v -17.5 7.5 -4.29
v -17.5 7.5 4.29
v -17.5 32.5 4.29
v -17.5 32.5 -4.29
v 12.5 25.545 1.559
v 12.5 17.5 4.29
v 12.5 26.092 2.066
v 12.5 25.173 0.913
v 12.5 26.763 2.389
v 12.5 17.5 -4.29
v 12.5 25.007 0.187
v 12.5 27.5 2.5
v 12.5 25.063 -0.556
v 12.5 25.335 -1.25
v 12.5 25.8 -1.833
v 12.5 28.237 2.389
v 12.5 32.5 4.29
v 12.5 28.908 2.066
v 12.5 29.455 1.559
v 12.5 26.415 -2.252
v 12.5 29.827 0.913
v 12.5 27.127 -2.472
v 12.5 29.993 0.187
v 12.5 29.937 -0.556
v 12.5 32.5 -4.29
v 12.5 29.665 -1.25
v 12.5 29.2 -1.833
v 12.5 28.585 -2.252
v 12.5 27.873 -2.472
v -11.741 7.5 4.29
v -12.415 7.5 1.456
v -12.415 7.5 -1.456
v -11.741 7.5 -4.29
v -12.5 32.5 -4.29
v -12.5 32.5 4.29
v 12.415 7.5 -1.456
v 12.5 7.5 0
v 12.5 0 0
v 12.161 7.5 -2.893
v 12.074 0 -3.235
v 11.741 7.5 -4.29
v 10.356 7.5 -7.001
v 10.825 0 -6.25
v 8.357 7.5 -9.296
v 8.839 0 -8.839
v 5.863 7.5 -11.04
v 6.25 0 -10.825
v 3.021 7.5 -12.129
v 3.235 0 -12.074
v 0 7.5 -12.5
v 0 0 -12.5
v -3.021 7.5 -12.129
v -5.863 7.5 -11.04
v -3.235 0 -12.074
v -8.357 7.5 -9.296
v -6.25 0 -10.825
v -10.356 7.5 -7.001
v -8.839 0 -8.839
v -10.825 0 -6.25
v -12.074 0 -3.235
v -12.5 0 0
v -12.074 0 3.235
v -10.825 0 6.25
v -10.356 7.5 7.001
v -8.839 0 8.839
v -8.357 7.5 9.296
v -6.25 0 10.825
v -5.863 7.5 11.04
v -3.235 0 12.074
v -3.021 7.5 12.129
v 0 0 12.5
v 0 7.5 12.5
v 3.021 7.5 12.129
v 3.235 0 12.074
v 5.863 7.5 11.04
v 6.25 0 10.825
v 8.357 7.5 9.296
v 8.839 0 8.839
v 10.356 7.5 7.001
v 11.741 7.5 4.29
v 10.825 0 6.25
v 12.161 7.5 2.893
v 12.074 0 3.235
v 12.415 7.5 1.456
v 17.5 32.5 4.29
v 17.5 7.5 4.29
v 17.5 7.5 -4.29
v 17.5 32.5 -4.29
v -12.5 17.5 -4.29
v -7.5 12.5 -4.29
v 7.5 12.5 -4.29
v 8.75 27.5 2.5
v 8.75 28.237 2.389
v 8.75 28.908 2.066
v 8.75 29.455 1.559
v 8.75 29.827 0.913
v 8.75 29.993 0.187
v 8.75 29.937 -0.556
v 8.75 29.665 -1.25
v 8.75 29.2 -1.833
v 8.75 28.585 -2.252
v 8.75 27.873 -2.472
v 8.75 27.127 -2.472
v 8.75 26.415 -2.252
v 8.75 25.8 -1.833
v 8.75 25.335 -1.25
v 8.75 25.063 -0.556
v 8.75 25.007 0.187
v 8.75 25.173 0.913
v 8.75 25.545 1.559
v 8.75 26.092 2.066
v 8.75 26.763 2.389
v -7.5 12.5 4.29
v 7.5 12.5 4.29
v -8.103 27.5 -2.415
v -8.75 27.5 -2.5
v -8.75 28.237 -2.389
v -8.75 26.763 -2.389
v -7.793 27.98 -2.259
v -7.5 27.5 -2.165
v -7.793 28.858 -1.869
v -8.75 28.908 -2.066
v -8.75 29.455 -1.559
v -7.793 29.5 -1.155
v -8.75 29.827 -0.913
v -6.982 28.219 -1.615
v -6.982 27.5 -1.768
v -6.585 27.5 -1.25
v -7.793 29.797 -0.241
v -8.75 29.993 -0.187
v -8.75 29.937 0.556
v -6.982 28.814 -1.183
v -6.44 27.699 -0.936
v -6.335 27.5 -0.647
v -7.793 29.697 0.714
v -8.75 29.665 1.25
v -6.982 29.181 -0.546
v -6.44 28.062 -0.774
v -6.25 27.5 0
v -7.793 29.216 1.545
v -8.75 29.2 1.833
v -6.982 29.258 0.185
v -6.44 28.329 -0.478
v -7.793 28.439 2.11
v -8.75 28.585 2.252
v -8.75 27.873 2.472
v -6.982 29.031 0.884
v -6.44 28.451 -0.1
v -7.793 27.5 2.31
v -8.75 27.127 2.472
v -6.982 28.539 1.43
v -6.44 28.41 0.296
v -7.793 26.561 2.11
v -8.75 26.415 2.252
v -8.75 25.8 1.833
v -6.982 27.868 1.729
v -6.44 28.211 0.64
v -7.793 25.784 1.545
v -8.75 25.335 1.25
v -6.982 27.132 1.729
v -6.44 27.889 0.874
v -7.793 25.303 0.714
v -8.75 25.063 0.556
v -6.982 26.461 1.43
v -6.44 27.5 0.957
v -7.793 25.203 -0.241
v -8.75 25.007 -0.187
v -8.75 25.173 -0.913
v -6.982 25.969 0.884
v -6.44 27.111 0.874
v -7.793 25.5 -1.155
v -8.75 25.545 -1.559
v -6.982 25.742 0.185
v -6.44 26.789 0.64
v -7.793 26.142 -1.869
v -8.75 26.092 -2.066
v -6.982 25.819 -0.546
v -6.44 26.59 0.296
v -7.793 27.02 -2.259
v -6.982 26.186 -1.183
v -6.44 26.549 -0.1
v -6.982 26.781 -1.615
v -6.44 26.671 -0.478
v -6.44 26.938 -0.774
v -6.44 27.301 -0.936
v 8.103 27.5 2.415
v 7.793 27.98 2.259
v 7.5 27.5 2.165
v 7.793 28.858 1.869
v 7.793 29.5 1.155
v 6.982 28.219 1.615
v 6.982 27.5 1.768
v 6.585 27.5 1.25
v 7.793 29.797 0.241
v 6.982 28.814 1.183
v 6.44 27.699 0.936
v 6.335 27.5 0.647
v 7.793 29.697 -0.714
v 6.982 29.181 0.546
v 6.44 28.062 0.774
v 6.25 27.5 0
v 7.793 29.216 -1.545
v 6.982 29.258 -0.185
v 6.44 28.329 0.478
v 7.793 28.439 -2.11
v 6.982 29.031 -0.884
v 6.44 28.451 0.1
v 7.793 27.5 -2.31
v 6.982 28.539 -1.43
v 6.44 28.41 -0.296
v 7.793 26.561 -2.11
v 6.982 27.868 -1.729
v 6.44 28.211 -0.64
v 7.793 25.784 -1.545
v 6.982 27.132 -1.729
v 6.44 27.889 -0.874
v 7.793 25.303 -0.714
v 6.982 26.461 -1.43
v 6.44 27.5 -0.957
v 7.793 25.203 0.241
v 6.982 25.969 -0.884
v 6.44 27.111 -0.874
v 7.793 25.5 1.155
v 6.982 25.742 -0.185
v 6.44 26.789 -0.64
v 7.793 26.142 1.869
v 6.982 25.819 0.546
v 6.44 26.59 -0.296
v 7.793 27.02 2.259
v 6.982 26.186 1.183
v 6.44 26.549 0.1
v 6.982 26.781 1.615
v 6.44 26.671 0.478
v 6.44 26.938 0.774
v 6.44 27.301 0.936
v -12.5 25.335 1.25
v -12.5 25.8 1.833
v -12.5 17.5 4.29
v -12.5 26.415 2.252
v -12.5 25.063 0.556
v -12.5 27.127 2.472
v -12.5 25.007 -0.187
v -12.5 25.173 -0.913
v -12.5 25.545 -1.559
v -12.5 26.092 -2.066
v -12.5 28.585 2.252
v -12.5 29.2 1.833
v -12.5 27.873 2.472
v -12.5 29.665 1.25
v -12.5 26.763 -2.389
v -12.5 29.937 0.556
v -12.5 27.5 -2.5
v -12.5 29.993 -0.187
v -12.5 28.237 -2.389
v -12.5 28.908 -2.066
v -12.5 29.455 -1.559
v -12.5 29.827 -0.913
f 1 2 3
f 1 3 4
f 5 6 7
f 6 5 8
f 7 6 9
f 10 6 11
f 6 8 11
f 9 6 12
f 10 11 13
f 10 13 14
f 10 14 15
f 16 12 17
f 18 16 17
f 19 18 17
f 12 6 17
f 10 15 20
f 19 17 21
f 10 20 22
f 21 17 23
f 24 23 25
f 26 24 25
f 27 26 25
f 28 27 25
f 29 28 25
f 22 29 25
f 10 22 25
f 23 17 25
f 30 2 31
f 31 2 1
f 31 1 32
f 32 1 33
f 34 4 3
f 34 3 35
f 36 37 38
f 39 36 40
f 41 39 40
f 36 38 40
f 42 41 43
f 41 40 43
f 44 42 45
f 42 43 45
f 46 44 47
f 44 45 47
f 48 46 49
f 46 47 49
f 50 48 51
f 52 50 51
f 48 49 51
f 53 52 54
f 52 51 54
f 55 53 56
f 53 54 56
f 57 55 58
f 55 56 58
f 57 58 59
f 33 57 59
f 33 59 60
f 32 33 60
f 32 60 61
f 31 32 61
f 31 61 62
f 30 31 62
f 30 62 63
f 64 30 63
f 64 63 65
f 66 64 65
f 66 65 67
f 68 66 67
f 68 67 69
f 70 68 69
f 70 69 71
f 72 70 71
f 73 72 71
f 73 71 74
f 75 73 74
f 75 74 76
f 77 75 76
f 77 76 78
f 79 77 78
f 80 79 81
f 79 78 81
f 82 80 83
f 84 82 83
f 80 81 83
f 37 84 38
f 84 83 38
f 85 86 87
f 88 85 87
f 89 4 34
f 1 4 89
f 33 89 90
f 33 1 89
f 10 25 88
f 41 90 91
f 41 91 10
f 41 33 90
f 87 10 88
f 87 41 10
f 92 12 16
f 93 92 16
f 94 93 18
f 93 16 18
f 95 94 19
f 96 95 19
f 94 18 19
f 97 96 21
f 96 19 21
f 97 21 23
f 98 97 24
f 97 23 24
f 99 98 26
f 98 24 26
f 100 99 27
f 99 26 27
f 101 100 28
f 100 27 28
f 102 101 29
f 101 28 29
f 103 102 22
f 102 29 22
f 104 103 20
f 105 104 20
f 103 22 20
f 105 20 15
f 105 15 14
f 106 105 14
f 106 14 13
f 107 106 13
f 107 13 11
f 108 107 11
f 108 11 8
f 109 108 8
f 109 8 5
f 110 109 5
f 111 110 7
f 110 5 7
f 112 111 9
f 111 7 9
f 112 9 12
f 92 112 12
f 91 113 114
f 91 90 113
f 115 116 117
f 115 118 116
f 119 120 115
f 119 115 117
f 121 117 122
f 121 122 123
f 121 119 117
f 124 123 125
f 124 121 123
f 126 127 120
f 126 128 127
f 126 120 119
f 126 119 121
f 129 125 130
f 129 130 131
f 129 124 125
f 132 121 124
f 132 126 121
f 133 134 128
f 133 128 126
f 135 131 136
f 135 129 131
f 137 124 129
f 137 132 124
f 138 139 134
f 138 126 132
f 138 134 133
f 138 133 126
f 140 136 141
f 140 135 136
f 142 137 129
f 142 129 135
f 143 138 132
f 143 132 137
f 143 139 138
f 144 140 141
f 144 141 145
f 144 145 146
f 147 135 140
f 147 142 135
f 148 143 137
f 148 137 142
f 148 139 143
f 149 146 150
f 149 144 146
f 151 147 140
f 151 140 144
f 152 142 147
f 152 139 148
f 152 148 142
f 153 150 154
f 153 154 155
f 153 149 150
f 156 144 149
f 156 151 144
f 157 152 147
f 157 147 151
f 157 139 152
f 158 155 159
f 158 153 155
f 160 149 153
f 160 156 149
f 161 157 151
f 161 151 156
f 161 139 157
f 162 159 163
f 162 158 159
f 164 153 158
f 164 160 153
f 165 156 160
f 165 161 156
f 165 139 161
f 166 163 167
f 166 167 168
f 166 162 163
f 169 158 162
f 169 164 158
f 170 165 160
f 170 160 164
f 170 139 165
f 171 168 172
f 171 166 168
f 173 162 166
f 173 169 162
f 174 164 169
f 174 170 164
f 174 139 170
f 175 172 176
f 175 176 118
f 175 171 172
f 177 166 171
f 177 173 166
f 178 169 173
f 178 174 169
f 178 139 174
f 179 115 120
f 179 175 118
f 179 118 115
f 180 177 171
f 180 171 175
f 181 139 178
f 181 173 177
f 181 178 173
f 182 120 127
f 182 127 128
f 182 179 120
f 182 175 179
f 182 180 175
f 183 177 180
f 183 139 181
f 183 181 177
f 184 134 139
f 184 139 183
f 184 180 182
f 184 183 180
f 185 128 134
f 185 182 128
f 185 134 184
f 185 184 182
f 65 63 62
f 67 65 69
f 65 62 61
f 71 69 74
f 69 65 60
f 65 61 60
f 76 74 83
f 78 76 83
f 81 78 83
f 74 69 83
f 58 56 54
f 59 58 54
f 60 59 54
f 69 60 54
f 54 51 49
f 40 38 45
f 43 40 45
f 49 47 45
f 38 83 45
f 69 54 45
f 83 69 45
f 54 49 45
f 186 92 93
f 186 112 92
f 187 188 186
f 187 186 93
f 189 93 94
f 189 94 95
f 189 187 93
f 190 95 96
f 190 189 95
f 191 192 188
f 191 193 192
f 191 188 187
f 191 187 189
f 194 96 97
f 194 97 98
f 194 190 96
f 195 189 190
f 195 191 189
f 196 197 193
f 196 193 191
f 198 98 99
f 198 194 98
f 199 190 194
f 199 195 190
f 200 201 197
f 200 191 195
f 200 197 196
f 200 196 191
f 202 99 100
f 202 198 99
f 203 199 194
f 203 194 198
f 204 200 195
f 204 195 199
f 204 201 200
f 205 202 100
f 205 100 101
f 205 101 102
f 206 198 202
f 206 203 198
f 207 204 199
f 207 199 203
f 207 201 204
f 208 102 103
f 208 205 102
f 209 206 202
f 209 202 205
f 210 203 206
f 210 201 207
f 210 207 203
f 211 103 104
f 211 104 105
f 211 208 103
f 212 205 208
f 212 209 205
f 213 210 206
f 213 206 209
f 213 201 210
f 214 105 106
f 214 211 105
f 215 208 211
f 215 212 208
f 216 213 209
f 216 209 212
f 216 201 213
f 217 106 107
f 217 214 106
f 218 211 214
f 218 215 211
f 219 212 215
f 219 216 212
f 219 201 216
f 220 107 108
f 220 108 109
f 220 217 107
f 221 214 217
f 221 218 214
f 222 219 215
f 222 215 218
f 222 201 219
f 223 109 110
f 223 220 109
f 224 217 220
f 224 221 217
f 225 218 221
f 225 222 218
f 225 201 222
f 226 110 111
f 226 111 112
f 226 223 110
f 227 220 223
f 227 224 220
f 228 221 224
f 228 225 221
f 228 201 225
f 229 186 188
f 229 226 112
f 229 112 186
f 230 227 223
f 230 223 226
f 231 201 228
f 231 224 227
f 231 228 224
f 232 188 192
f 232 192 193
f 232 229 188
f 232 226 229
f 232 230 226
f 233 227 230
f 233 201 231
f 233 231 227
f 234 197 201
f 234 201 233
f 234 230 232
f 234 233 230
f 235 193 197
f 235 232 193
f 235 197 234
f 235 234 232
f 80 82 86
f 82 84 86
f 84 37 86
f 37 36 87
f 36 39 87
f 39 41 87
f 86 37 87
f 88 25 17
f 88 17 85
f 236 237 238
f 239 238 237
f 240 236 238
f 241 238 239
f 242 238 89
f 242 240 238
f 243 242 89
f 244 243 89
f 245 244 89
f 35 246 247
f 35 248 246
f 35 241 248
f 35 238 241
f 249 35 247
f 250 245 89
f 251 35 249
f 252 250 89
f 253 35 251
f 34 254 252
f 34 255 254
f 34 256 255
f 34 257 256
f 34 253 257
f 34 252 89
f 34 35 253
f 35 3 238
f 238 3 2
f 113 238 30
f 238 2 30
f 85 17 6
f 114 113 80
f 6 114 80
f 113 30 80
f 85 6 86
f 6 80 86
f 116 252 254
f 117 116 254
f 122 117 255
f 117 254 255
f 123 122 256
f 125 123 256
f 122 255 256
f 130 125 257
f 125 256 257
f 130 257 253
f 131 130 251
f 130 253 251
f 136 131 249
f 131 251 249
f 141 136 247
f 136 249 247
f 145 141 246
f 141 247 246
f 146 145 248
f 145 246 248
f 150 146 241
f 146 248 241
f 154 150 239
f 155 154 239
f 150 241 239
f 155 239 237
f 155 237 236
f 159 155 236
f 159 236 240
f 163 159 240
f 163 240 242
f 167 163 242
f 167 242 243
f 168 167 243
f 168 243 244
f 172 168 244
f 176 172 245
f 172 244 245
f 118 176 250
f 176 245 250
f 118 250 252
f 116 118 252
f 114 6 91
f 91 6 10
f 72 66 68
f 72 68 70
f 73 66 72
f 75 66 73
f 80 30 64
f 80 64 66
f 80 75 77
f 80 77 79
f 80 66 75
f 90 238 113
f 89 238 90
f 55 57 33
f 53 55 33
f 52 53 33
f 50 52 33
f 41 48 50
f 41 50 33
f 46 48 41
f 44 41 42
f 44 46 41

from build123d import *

# Parameters (mm, degrees)
SKETCH1_R           = 12.5
BOSS_EXTRUDE1_DEPTH = 7.5
SKETCH2_W           = 35
SKETCH2_H           = 8.580767914
BOSS_EXTRUDE2_DEPTH = 25
SKETCH3_W           = 25
SKETCH3_H           = 8.580767914
CUT_EXTRUDE1_DEPTH  = 20
SKETCH4_R           = 2.5
BOSS_EXTRUDE3_DEPTH = 6.25
SKETCH5_R           = 2.5
BOSS_EXTRUDE4_DEPTH = 6.25
CHAMFER1_SIZE       = 5
CHAMFER2_SIZE       = 5
FILLET1_R           = 2.5
FILLET2_R           = 2.5


with BuildPart() as part:
    # Sketch1 → Boss-Extrude1 (new body)
    with BuildSketch(Plane(origin=(0, 0, 0), x_dir=(1, 0, 0), z_dir=(0, 1, 0))):
        Circle(SKETCH1_R)
    extrude(amount=BOSS_EXTRUDE1_DEPTH)

    # Sketch2 → Boss-Extrude2 (add)
    with BuildSketch(Plane(origin=(0, 7.5, 0), x_dir=(1, 0, 0), z_dir=(0, 1, 0))):
        Rectangle(SKETCH2_W, SKETCH2_H)
    extrude(amount=BOSS_EXTRUDE2_DEPTH)

    # Sketch3 → Cut-Extrude1 (cut)
    with BuildSketch(Plane(origin=(0, 32.5, 0), x_dir=(1, 0, 0), z_dir=(0, 1, 0))):
        Rectangle(SKETCH3_W, SKETCH3_H)
    extrude(amount=-CUT_EXTRUDE1_DEPTH, mode=Mode.SUBTRACT)

    # Sketch4 → Boss-Extrude3 (add)
    with BuildSketch(Plane(origin=(-12.5, 0, 0), x_dir=(0, 0, -1), z_dir=(1, 0, 0))):
        with Locations((0, 27.5)):
            Circle(SKETCH4_R)
    extrude(amount=BOSS_EXTRUDE3_DEPTH)

    # Sketch5 → Boss-Extrude4 (add)
    with BuildSketch(Plane.ZY.offset(-12.5)):
        with Locations((0, 27.5)):
            Circle(SKETCH5_R)
    extrude(amount=BOSS_EXTRUDE4_DEPTH)

    # Chamfer1
    chamfer1_edges = [part.edges().sort_by_distance(p)[0] for p in [
        (-12.5, 12.5, 0),
    ]]
    chamfer(chamfer1_edges, length=CHAMFER1_SIZE)

    # Chamfer2
    chamfer2_edges = [part.edges().sort_by_distance(p)[0] for p in [
        (12.5, 12.5, 0),
    ]]
    chamfer(chamfer2_edges, length=CHAMFER2_SIZE)

    # Fillet1
    fillet1_edges = [part.edges().sort_by_distance(p)[0] for p in [
        (-6.25, 27.5, 2.5),
    ]]
    fillet(fillet1_edges, radius=FILLET1_R)

    # Fillet2
    fillet2_edges = [part.edges().sort_by_distance(p)[0] for p in [
        (6.25, 27.5, -2.5),
    ]]
    fillet(fillet2_edges, radius=FILLET2_R)


solid = part.part
